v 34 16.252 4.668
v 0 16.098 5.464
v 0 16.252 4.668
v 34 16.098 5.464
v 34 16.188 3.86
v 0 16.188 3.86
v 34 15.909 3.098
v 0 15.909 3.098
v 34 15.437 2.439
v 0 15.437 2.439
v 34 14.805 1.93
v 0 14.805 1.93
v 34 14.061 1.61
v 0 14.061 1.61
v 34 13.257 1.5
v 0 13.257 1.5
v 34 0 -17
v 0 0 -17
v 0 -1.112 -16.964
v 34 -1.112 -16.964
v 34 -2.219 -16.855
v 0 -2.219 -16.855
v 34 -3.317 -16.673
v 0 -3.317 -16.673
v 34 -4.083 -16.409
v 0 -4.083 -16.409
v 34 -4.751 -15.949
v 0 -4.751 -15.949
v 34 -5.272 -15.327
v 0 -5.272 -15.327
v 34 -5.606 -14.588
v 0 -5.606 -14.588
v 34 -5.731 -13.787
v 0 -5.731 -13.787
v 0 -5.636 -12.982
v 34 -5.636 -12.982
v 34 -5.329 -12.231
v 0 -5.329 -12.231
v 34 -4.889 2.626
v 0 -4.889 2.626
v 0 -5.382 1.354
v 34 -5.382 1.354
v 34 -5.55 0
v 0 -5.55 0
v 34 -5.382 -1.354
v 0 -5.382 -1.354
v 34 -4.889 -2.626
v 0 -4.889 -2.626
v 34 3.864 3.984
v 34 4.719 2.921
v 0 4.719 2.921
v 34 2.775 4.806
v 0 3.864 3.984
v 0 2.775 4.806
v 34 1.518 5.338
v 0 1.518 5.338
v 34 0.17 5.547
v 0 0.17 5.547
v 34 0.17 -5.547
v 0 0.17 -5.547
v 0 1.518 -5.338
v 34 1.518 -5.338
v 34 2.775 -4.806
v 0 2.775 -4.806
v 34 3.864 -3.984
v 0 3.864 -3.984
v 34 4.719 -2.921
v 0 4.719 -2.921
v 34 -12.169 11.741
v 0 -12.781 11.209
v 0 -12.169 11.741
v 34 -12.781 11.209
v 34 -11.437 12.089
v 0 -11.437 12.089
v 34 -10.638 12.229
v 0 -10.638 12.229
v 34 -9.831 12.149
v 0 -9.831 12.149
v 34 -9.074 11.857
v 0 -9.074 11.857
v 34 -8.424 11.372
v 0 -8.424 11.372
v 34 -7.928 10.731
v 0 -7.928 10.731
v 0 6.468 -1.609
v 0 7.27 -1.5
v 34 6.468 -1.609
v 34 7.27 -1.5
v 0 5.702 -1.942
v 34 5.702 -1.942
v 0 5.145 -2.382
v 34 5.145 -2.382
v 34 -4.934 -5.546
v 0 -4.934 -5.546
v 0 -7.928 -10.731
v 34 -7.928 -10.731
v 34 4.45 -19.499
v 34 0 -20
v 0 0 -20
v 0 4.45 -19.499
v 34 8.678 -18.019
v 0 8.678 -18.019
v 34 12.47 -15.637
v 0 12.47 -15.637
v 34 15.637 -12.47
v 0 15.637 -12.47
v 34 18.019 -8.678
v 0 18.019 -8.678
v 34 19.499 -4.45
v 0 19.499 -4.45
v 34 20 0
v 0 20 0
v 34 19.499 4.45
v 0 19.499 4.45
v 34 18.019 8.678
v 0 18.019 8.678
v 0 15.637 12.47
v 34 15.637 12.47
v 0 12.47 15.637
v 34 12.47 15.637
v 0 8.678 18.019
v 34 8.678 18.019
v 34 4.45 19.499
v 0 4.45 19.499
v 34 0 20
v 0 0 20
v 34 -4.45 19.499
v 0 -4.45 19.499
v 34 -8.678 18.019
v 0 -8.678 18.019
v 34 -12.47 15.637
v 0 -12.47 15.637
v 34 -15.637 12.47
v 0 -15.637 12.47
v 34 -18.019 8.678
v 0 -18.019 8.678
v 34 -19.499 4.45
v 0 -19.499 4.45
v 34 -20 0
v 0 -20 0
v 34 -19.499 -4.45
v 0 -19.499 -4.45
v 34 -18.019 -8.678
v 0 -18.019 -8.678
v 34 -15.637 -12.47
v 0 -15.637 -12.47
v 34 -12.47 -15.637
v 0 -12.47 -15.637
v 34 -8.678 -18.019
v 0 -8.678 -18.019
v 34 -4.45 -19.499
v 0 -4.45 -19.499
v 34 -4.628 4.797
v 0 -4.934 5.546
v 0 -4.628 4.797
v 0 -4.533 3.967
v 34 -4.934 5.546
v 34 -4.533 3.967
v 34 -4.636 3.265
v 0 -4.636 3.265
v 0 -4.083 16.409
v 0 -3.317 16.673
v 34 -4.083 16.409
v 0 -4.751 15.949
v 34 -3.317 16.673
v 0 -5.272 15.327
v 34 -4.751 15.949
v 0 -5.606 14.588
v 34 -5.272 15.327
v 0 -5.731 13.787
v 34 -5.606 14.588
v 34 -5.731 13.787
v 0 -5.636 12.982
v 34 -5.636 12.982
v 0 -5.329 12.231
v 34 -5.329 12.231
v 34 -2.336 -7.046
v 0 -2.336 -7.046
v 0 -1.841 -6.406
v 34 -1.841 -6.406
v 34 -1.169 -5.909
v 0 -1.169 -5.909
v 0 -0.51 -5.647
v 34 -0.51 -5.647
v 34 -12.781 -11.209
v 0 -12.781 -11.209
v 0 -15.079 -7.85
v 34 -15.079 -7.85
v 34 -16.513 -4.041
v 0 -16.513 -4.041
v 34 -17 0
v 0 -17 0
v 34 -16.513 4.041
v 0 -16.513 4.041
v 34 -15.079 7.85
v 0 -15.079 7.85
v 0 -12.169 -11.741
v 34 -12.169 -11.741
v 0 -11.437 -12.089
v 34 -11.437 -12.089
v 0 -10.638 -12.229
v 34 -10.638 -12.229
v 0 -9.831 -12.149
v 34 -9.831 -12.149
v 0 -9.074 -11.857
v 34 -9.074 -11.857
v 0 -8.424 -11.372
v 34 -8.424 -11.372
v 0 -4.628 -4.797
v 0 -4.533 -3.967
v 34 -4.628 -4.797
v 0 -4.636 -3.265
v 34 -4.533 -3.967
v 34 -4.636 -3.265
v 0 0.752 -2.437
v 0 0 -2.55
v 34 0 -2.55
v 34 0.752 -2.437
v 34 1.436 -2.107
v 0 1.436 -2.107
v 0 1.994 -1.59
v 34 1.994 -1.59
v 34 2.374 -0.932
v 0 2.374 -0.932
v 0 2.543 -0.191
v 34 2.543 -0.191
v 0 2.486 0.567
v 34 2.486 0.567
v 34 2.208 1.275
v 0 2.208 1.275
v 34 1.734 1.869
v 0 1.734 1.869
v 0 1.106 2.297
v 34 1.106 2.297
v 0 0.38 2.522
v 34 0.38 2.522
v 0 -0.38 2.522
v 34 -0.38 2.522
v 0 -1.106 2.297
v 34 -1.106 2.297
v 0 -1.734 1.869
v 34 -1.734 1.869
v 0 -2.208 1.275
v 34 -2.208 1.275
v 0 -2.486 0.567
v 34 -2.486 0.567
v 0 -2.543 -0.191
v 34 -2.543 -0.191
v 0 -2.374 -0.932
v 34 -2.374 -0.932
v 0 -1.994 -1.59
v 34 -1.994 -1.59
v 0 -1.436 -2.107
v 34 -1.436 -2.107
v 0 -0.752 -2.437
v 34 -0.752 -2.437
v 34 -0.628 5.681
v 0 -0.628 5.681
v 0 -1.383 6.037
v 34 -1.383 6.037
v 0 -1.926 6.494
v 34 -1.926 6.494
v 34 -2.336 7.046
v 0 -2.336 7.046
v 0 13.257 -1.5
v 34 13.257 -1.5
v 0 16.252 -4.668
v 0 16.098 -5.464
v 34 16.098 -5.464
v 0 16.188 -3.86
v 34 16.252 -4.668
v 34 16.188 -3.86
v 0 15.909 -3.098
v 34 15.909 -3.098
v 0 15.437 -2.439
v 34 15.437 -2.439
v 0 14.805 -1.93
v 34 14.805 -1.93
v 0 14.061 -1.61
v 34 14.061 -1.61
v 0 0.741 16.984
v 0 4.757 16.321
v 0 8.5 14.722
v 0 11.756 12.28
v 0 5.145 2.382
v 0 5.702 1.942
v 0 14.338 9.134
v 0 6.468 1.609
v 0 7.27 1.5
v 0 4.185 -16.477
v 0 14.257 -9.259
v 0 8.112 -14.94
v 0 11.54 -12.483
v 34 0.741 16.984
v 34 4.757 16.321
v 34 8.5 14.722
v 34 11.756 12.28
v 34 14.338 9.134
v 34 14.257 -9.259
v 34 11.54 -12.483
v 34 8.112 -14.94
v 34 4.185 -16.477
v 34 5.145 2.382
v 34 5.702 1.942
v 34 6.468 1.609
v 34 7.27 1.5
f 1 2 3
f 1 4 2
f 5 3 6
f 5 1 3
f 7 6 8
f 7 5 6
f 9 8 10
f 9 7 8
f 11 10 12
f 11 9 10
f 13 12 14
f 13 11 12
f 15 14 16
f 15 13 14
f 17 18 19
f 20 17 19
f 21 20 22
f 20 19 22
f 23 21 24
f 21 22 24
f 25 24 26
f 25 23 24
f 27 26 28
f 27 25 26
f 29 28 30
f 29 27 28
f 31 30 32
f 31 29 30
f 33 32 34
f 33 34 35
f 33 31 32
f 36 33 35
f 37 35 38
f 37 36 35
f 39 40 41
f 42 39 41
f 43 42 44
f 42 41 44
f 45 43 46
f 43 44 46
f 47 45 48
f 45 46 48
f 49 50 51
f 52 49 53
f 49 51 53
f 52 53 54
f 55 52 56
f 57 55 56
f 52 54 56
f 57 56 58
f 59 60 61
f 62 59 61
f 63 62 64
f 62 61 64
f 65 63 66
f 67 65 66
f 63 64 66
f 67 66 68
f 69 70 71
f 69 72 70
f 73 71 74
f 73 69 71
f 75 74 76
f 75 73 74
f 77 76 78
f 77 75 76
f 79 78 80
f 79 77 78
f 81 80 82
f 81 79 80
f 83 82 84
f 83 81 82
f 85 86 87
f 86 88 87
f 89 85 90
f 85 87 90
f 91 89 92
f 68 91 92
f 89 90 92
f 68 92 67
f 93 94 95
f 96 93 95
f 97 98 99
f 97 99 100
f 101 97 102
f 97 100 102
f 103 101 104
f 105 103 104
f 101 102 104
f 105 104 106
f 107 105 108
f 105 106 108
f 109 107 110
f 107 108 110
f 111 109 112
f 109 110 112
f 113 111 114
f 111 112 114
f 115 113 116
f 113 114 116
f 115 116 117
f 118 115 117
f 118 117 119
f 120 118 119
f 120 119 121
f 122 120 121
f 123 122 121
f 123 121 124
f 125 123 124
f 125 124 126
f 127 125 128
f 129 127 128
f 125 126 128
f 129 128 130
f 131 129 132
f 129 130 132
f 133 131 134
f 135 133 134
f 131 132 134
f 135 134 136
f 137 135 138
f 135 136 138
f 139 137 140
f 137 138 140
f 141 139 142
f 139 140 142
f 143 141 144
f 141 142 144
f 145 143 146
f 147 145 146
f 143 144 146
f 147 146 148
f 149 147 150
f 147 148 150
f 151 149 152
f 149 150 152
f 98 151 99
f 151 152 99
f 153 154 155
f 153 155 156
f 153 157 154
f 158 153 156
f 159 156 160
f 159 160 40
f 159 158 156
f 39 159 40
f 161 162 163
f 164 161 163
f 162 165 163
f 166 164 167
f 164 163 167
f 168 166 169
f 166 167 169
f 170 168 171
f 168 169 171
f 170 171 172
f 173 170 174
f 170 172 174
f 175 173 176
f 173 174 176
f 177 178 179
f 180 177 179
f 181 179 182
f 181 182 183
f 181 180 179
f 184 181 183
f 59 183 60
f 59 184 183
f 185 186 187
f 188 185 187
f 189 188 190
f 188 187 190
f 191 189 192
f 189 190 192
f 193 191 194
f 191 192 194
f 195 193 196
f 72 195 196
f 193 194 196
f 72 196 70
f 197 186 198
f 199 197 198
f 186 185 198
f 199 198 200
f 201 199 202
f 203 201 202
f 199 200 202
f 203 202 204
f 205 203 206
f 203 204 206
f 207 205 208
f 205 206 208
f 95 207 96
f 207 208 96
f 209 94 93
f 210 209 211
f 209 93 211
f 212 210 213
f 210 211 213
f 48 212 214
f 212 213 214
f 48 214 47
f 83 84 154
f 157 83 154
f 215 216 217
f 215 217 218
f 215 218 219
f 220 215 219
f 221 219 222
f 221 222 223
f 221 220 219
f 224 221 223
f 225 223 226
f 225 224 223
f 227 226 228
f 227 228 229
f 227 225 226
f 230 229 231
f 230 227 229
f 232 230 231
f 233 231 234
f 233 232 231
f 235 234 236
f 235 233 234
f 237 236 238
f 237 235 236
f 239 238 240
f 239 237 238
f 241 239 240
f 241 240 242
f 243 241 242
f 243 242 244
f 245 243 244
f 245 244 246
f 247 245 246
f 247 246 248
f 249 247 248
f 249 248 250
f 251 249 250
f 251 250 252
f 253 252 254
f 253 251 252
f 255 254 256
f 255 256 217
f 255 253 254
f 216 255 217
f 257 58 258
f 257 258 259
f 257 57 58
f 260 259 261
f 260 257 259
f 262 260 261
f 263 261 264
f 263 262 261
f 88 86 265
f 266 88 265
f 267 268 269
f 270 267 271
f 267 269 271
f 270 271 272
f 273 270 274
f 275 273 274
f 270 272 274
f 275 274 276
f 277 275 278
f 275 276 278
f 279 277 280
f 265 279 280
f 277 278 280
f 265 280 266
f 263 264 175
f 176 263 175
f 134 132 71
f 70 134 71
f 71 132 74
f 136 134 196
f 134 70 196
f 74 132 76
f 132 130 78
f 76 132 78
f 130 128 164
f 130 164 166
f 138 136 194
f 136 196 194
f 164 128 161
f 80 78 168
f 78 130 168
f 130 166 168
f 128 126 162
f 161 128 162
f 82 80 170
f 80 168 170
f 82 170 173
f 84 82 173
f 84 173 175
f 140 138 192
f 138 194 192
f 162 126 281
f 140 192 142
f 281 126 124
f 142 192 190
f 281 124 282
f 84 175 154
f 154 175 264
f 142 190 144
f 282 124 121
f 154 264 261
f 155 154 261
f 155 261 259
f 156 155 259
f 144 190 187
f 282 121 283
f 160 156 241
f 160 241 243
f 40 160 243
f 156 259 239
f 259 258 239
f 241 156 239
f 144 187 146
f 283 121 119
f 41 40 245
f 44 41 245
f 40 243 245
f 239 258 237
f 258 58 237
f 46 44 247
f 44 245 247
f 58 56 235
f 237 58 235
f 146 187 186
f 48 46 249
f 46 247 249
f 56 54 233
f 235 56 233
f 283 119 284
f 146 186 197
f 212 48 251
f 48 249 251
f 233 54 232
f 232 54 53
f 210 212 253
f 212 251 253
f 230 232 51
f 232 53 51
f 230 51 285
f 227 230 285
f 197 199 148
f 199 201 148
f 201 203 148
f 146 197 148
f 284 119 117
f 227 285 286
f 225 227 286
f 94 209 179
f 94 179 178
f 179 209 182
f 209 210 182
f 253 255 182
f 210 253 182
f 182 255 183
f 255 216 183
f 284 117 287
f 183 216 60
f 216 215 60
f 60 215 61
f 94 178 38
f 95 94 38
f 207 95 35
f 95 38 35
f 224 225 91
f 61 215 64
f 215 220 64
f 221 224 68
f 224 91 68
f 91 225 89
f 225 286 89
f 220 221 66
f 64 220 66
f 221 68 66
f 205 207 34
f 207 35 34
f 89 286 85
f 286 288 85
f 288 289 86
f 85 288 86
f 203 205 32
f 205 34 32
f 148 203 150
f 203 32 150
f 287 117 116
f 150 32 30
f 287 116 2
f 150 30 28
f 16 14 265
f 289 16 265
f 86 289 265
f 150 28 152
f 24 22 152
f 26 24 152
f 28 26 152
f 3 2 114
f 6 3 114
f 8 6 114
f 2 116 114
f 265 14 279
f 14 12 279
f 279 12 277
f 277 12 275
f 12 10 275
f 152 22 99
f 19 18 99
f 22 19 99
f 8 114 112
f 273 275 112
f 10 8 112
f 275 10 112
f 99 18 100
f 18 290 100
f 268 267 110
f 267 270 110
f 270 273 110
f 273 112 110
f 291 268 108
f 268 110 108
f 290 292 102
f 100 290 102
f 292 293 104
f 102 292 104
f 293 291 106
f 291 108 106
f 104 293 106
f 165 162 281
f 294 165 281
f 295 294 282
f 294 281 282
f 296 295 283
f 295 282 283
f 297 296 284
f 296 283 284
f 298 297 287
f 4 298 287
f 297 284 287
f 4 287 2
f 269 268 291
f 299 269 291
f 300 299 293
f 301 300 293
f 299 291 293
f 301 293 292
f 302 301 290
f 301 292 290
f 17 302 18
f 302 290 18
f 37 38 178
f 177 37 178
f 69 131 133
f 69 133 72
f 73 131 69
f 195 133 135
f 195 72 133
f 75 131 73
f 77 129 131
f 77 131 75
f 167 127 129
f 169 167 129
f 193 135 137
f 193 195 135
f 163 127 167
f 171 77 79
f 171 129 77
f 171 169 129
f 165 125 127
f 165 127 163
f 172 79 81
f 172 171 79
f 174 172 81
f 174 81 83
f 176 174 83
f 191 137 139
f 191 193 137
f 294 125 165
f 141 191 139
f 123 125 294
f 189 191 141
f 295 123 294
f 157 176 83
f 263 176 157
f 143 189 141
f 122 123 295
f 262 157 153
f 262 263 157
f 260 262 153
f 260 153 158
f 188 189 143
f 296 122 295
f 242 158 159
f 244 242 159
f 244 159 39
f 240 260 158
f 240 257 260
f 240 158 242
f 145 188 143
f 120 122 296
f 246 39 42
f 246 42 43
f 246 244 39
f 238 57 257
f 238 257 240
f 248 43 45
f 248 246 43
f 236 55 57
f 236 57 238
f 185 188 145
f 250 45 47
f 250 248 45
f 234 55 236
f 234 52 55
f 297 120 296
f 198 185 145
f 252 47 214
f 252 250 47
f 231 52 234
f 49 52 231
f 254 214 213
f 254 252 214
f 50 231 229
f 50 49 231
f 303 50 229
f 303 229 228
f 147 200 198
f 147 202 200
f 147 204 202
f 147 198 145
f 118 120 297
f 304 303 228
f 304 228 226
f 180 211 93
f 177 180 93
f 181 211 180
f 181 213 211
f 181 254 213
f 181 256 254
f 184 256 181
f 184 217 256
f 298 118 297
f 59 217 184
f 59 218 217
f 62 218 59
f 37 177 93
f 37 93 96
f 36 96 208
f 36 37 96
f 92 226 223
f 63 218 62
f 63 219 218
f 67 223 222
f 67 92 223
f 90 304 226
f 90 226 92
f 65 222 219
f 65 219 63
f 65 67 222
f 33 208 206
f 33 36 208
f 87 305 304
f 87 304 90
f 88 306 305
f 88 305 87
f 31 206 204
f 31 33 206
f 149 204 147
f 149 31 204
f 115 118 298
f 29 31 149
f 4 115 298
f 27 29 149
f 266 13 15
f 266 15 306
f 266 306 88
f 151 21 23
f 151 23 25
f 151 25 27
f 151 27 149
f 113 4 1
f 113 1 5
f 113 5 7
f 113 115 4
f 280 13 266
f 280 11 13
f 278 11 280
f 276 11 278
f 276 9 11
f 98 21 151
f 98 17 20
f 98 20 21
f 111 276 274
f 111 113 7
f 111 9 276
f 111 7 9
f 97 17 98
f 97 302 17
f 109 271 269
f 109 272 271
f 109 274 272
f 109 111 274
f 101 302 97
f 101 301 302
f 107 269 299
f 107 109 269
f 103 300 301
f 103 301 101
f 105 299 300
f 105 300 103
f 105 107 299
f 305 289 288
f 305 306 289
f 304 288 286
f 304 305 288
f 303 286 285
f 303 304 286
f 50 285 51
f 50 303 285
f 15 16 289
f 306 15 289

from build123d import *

# Parameters (mm, degrees)
SKETCH1_R           = 20
SKETCH1_R_2         = 2.55
BOSS_EXTRUDE1_DEPTH = 34
FILLET1_R           = 3


with BuildPart() as part:
    # Sketch1 → Boss-Extrude1 (new body)
    # profile 1 of 11: a face of its own
    with BuildSketch(Plane(origin=(0, 0, 0), x_dir=(0, 0, -1), z_dir=(1, 0, 0))):
        Circle(SKETCH1_R)
        with BuildLine():
            ThreePointArc((-15.415009376, -7.167809005), (-14.722431864, 8.5), (-1.5, 16.933694222))
            Line((-1.5, 16.933694222), (-1.5, 17))
            ThreePointArc((-1.5, 17), (0, 18.5), (1.5, 17))
            Line((1.5, 17), (1.5, 16.933694222))
            ThreePointArc((1.5, 16.933694222), (12.539936204, 11.478240283), (17, 0))
            ThreePointArc((17, 0), (16.599023456, -3.670479574), (15.415009376, -7.167809005))
            Line((15.415009376, -7.167809005), (15.472431864, -7.200961894))
            ThreePointArc((15.472431864, -7.200961894), (16.02146997, -9.25), (13.972431864, -9.799038106))
            Line((13.972431864, -9.799038106), (13.915009376, -9.765885217))
            ThreePointArc((13.915009376, -9.765885217), (0, -17), (-13.915009376, -9.765885217))
            Line((-13.915009376, -9.765885217), (-13.972431864, -9.799038106))
            ThreePointArc((-13.972431864, -9.799038106), (-16.02146997, -9.25), (-15.472431864, -7.200961894))
            Line((-15.472431864, -7.200961894), (-15.415009376, -7.167809005))
        make_face(mode=Mode.SUBTRACT)
    # profile 2 of 11: a face of its own
    with BuildSketch(Plane(origin=(0, 0, 0), x_dir=(0, 0, -1), z_dir=(1, 0, 0))):
        with BuildLine():
            ThreePointArc((1.486240766, 5.347297297), (0, 4.05), (-1.486240766, 5.347297297))
            ThreePointArc((-1.486240766, 5.347297297), (-4.806440991, 2.775), (-5.374015684, -1.386526389))
            ThreePointArc((-5.374015684, -1.386526389), (-3.507402885, -2.025), (-3.887774918, -3.960770908))
            ThreePointArc((-3.887774918, -3.960770908), (0, -5.55), (3.887774918, -3.960770908))
            ThreePointArc((3.887774918, -3.960770908), (3.507402885, -2.025), (5.374015684, -1.386526389))
            ThreePointArc((5.374015684, -1.386526389), (5.505828141, -0.698825069), (5.55, 0))
            ThreePointArc((5.55, 0), (4.418774505, 3.358114333), (1.486240766, 5.347297297))
        make_face()
        Circle(SKETCH1_R_2, mode=Mode.SUBTRACT)
    # profile 3 of 11: a face of its own
    with BuildSketch(Plane(origin=(0, 0, 0), x_dir=(0, 0, -1), z_dir=(1, 0, 0))):
        with BuildLine():
            ThreePointArc((-3.887774918, -3.960770908), (-3.507402885, -2.025), (-5.374015684, -1.386526389))
            ThreePointArc((-5.374015684, -1.386526389), (-4.806440991, -2.775), (-3.887774918, -3.960770908))
        make_face()
    # profile 4 of 11: a face of its own
    with BuildSketch(Plane(origin=(0, 0, 0), x_dir=(0, 0, -1), z_dir=(1, 0, 0))):
        with BuildLine():
            ThreePointArc((-13.915009376, -9.765885217), (-14.722431864, -8.5), (-15.415009376, -7.167809005))
            Line((-15.415009376, -7.167809005), (-15.472431864, -7.200961894))
            ThreePointArc((-15.472431864, -7.200961894), (-16.02146997, -9.25), (-13.972431864, -9.799038106))
            Line((-13.972431864, -9.799038106), (-13.915009376, -9.765885217))
        make_face()
    # profile 5 of 11: a face of its own
    with BuildSketch(Plane(origin=(0, 0, 0), x_dir=(0, 0, -1), z_dir=(1, 0, 0))):
        with BuildLine():
            ThreePointArc((3.887774918, -3.960770908), (4.806440991, -2.775), (5.374015684, -1.386526389))
            ThreePointArc((5.374015684, -1.386526389), (3.507402885, -2.025), (3.887774918, -3.960770908))
        make_face()
    # profile 6 of 11: a face of its own
    with BuildSketch(Plane(origin=(0, 0, 0), x_dir=(0, 0, -1), z_dir=(1, 0, 0))):
        with BuildLine():
            ThreePointArc((1.486240766, 5.347297297), (0, 5.55), (-1.486240766, 5.347297297))
            ThreePointArc((-1.486240766, 5.347297297), (0, 4.05), (1.486240766, 5.347297297))
        make_face()
    # profile 7 of 11: a face of its own
    with BuildSketch(Plane(origin=(0, 0, 0), x_dir=(0, 0, -1), z_dir=(1, 0, 0))):
        with BuildLine():
            Line((15.472431864, -7.200961894), (15.415009376, -7.167809005))
            ThreePointArc((15.415009376, -7.167809005), (14.722431864, -8.5), (13.915009376, -9.765885217))
            Line((13.915009376, -9.765885217), (13.972431864, -9.799038106))
            ThreePointArc((13.972431864, -9.799038106), (16.02146997, -9.25), (15.472431864, -7.200961894))
        make_face()
    # profile 8 of 11: a face of its own
    with BuildSketch(Plane(origin=(0, 0, 0), x_dir=(0, 0, -1), z_dir=(1, 0, 0))):
        with BuildLine():
            ThreePointArc((13.915009376, -9.765885217), (14.722431864, -8.5), (15.415009376, -7.167809005))
            Line((15.415009376, -7.167809005), (5.556440991, -1.475961894))
            ThreePointArc((5.556440991, -1.475961894), (5.466744289, -1.428151993), (5.374015684, -1.386526389))
            ThreePointArc((5.374015684, -1.386526389), (4.806440991, -2.775), (3.887774918, -3.960770908))
            ThreePointArc((3.887774918, -3.960770908), (3.970188051, -4.020263434), (4.056440991, -4.074038106))
            Line((4.056440991, -4.074038106), (13.915009376, -9.765885217))
        make_face()
    # profile 9 of 11: a face of its own
    with BuildSketch(Plane(origin=(0, 0, 0), x_dir=(0, 0, -1), z_dir=(1, 0, 0))):
        with BuildLine():
            Line((-5.556440991, -1.475961894), (-15.415009376, -7.167809005))
            ThreePointArc((-15.415009376, -7.167809005), (-14.722431864, -8.5), (-13.915009376, -9.765885217))
            Line((-13.915009376, -9.765885217), (-4.056440991, -4.074038106))
            ThreePointArc((-4.056440991, -4.074038106), (-3.970188051, -4.020263434), (-3.887774918, -3.960770908))
            ThreePointArc((-3.887774918, -3.960770908), (-4.806440991, -2.775), (-5.374015684, -1.386526389))
            ThreePointArc((-5.374015684, -1.386526389), (-5.466744289, -1.428151993), (-5.556440991, -1.475961894))
        make_face()
    # profile 10 of 11: a face of its own
    with BuildSketch(Plane(origin=(0, 0, 0), x_dir=(0, 0, -1), z_dir=(1, 0, 0))):
        with BuildLine():
            Line((-1.5, 16.933694222), (-1.5, 5.55))
            ThreePointArc((-1.5, 5.55), (-1.496556238, 5.448415427), (-1.486240766, 5.347297297))
            ThreePointArc((-1.486240766, 5.347297297), (0, 5.55), (1.486240766, 5.347297297))
            ThreePointArc((1.486240766, 5.347297297), (1.496556238, 5.448415427), (1.5, 5.55))
            Line((1.5, 5.55), (1.5, 16.933694222))
            ThreePointArc((1.5, 16.933694222), (0, 17), (-1.5, 16.933694222))
        make_face()
    # profile 11 of 11: a face of its own
    with BuildSketch(Plane(origin=(0, 0, 0), x_dir=(0, 0, -1), z_dir=(1, 0, 0))):
        with BuildLine():
            Line((-1.5, 17), (-1.5, 16.933694222))
            ThreePointArc((-1.5, 16.933694222), (0, 17), (1.5, 16.933694222))
            Line((1.5, 16.933694222), (1.5, 17))
            ThreePointArc((1.5, 17), (0, 18.5), (-1.5, 17))
        make_face()
    extrude(amount=BOSS_EXTRUDE1_DEPTH)

    # Fillet1
    fillet1_edges = [part.edges().sort_by_distance(p)[0] for p in [
        (17, 16.933694222, -1.5),
        (17, 5.347297297, -1.486240766),
        (17, 5.347297297, 1.486240766),
        (17, -1.386526389, -5.374015684),
        (17, -3.960770908, -3.887774918),
        (17, -7.167809005, -15.415009376),
        (17, -3.960770908, 3.887774918),
        (17, -1.386526389, 5.374015684),
        (17, -9.765885217, 13.915009376),
        (17, -9.765885217, -13.915009376),
        (17, 16.933694222, 1.5),
        (17, -7.167809005, 15.415009376),
    ]]
    fillet(fillet1_edges, radius=FILLET1_R)


solid = part.part
